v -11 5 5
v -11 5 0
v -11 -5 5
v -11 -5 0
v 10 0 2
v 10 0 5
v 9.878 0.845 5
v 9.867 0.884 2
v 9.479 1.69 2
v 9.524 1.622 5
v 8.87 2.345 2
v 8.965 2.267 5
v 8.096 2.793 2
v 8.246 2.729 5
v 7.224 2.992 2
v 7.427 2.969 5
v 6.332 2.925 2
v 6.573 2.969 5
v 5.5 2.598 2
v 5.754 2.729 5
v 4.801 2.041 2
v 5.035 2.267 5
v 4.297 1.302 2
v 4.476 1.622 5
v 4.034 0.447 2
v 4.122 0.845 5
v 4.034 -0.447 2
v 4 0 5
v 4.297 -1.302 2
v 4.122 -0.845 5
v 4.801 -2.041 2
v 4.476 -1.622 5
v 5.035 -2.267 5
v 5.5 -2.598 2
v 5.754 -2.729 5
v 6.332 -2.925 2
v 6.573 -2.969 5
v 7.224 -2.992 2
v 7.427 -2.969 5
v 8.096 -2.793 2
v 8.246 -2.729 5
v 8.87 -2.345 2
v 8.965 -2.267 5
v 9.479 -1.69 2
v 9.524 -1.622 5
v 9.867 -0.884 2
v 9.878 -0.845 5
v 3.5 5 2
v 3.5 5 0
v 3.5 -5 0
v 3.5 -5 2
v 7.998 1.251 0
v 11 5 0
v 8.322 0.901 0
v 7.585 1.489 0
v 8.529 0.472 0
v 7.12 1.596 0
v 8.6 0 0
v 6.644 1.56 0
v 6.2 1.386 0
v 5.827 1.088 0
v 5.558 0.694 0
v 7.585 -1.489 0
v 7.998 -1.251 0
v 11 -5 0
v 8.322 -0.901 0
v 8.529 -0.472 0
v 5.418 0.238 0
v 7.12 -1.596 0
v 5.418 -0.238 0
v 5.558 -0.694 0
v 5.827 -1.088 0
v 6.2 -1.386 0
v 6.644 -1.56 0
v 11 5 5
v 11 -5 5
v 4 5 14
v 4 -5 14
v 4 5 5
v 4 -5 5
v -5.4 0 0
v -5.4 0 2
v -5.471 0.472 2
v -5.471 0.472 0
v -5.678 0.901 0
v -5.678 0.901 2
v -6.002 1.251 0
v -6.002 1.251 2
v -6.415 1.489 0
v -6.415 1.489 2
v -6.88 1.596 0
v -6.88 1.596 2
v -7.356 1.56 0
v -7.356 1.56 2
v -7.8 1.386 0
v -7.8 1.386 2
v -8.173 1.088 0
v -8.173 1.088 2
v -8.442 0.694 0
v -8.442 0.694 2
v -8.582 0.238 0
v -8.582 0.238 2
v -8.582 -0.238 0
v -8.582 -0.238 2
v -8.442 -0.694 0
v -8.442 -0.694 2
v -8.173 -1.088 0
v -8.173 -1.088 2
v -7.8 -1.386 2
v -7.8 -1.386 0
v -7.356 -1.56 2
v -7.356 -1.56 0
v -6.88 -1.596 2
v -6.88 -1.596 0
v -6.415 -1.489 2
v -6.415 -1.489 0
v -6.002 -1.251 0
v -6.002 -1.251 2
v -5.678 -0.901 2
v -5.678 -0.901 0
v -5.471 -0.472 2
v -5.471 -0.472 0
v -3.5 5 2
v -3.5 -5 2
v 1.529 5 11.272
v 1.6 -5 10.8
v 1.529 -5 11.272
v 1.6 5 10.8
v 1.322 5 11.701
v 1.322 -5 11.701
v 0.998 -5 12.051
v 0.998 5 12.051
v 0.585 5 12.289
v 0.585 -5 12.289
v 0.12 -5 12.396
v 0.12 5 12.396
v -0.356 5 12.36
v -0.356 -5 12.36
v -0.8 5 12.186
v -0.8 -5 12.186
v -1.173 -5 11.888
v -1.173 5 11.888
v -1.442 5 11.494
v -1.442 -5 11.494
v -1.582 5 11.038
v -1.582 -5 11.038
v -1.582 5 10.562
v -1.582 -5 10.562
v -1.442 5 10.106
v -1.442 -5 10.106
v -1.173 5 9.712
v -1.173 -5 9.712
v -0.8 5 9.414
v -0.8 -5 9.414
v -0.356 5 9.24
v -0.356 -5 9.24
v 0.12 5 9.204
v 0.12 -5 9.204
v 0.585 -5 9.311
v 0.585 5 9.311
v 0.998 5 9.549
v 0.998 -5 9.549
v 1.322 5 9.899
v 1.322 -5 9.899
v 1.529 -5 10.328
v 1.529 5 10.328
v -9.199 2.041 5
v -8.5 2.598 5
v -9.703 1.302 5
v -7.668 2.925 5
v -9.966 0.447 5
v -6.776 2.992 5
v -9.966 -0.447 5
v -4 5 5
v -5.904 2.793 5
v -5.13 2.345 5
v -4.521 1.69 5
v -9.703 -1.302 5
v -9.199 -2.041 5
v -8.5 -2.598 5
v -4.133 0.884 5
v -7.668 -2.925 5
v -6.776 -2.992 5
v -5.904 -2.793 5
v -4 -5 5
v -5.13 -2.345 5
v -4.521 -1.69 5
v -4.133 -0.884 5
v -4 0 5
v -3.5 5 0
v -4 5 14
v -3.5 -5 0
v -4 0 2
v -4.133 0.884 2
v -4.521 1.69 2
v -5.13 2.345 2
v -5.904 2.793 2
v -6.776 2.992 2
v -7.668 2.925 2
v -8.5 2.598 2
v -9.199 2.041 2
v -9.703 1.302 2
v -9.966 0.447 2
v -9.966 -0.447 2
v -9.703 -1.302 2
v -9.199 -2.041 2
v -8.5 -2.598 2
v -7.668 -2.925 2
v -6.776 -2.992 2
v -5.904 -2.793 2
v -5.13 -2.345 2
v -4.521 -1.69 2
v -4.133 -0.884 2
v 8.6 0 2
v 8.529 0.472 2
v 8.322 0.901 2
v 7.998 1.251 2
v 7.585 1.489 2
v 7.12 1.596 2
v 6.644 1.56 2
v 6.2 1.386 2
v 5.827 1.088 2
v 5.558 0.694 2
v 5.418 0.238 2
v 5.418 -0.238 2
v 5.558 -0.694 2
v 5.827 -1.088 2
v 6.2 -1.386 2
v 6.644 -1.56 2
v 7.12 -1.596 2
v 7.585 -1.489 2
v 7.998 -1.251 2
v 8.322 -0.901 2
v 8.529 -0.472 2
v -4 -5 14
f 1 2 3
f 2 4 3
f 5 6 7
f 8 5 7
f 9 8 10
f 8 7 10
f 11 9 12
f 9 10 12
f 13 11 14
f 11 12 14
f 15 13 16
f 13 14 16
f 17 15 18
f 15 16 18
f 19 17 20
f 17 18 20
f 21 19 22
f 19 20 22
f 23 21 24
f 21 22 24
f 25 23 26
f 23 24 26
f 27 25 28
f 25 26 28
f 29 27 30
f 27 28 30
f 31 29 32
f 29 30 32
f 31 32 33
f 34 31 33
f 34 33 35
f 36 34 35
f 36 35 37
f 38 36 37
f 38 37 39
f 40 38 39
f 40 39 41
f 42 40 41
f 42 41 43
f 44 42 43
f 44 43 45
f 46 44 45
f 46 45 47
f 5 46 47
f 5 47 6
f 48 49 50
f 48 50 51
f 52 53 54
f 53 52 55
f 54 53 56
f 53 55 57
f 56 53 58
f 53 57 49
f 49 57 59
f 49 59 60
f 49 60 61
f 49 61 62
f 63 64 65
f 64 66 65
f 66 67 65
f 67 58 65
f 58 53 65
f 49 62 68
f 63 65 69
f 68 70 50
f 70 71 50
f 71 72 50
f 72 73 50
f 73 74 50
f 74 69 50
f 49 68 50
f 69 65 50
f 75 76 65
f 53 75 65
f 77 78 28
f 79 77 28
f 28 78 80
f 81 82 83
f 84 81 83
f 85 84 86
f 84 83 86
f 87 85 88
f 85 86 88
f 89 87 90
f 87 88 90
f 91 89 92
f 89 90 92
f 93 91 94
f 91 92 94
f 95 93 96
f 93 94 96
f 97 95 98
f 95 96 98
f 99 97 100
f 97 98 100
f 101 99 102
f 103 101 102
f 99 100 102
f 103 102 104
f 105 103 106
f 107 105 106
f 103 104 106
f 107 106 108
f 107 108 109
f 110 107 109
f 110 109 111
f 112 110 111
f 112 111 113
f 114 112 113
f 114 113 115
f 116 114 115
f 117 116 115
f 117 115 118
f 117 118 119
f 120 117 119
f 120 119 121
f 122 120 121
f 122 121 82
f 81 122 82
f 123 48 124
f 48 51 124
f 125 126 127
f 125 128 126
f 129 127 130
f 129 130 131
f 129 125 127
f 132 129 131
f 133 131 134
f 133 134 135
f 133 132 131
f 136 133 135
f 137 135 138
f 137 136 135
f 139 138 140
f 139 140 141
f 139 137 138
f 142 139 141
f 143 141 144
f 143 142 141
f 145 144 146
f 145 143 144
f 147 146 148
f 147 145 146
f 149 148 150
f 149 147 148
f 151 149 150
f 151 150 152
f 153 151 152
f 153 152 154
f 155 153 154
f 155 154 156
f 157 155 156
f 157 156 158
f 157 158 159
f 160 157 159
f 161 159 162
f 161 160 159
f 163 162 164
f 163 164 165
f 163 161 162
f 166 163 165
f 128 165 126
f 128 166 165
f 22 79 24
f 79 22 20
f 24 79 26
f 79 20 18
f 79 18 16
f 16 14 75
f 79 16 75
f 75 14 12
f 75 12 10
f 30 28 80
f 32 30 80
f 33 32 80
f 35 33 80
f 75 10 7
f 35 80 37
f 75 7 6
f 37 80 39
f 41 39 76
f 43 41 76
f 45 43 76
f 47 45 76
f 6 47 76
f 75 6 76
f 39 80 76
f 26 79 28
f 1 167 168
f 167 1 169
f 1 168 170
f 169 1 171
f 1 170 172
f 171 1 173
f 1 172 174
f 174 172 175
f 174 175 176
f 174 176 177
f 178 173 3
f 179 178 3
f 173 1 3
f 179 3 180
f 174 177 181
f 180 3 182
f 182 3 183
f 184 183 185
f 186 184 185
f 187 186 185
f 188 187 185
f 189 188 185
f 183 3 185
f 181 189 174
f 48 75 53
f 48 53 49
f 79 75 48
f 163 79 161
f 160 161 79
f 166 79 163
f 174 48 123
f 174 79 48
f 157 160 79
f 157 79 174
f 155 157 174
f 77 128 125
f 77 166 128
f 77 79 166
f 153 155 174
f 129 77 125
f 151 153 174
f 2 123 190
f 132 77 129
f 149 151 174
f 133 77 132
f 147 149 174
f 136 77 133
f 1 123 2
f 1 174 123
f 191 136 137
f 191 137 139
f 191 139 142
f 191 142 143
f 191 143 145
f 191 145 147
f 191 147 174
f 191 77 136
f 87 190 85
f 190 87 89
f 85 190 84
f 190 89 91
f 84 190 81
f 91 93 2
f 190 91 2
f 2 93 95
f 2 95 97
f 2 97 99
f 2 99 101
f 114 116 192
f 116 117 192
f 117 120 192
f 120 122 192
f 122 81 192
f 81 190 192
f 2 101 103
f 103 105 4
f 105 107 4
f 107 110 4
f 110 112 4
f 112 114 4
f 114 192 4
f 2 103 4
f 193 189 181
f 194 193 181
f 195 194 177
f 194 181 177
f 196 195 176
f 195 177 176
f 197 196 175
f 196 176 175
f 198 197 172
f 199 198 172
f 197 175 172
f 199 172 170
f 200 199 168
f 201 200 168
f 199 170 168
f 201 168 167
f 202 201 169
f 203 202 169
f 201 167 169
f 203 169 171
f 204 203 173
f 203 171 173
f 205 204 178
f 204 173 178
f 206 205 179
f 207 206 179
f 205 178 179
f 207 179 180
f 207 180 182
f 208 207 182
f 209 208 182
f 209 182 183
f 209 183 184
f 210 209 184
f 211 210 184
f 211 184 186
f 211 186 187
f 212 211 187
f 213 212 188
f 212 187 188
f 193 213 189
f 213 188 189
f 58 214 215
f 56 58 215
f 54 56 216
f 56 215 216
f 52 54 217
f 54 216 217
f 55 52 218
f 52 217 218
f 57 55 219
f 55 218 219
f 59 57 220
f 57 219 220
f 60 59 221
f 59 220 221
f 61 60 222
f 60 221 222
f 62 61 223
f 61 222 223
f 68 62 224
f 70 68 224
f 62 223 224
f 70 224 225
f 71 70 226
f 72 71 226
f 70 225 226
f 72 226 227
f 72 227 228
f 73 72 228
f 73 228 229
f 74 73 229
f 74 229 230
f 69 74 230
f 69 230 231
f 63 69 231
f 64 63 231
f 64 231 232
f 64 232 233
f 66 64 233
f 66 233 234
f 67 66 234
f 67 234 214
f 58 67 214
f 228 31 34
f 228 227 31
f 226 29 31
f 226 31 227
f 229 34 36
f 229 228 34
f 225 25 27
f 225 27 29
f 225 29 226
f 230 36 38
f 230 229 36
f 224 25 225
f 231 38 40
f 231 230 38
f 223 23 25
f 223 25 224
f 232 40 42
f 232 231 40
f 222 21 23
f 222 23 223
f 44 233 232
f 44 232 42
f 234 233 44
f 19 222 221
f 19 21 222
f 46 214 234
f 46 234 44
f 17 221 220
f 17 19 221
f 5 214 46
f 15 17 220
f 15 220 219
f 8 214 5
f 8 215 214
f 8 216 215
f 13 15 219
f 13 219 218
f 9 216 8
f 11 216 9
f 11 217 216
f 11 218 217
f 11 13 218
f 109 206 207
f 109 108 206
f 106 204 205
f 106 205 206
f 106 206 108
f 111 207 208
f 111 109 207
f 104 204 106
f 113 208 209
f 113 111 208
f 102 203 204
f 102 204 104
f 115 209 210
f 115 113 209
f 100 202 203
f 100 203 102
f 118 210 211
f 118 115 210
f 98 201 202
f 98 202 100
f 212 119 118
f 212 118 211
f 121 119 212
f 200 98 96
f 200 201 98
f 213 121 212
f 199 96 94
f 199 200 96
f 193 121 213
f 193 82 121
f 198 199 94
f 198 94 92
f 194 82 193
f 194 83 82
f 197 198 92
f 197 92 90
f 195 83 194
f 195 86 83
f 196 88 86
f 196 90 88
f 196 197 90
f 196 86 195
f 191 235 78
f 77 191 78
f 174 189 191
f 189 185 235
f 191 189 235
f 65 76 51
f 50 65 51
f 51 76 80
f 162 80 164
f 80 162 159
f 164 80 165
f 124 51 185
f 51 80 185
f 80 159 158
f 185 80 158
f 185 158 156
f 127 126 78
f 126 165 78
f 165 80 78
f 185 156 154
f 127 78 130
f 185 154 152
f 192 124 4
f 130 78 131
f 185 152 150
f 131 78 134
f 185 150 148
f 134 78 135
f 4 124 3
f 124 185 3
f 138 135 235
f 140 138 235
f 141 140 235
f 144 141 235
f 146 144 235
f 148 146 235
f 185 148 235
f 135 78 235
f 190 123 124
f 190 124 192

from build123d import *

# Parameters (mm, degrees)
SKETCH_R        = 1.6
PAD_DEPTH       = 5
SKETCH001_R     = 1.6
POCKET_DEPTH    = 5.001
SKETCH002_R     = 3
POCKET001_DEPTH = 3


with BuildPart() as part:
    # Sketch → Pad (new body, symmetric)
    with BuildSketch(Plane.XZ):
        Polygon((11, 5), (11, 0), (3.5, 0), (3.5, 2), (-3.5, 2), (-3.5, 0), (-11, 0), (-11, 5), (-4, 5), (-4, 14), (4, 14), (4, 5), align=None)
        with Locations((0, 10.8)):
            Circle(SKETCH_R, mode=Mode.SUBTRACT)
    extrude(amount=PAD_DEPTH, both=True)

    # Sketch001 (on DatumPlane) → Pocket (cut, through all)
    with BuildSketch(Plane.XY.offset(5)):
        with Locations((-7, 0)):
            Circle(SKETCH001_R)
        with Locations((7, 0)):
            Circle(SKETCH001_R)
    extrude(amount=-POCKET_DEPTH, mode=Mode.SUBTRACT)

    # Sketch002 (on DatumPlane) → Pocket001 (cut)
    with BuildSketch(Plane.XY.offset(5)):
        with Locations((-7, 0)):
            Circle(SKETCH002_R)
        with Locations((7, 0)):
            Circle(SKETCH002_R)
    extrude(amount=-POCKET001_DEPTH, mode=Mode.SUBTRACT)


solid = part.part
